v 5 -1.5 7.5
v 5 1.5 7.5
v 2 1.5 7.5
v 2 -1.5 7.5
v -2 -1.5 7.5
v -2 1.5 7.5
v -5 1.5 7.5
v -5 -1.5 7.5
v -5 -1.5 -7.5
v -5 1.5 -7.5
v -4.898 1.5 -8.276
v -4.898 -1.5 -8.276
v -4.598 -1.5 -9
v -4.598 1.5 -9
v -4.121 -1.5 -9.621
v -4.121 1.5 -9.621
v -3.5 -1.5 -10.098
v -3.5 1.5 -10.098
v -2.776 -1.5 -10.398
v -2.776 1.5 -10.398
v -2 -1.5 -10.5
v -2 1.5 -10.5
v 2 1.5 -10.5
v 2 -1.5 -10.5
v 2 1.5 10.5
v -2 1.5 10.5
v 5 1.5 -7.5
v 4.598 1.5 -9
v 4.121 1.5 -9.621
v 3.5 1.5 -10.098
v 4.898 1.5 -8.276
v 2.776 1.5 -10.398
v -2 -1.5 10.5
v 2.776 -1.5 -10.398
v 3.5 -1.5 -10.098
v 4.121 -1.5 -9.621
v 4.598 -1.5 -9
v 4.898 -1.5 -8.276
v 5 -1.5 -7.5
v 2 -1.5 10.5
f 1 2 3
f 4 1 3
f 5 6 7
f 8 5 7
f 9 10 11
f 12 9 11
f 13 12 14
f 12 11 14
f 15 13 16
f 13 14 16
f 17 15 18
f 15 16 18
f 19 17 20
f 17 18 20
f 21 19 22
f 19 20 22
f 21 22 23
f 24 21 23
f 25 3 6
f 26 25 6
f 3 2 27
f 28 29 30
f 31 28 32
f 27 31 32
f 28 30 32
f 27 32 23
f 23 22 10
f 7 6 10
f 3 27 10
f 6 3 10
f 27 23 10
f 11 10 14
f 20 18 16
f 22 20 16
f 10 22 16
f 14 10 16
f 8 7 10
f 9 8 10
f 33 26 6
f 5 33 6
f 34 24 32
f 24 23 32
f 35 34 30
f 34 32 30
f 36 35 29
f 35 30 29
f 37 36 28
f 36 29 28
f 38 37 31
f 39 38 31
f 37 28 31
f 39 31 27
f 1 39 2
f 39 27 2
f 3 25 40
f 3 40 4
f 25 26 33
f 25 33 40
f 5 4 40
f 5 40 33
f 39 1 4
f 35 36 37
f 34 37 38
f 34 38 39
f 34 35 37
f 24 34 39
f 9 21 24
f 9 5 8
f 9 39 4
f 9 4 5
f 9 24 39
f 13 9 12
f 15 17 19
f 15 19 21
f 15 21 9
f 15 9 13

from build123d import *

# Parameters (mm, degrees)
BOSS_EXTRUDE4_DEPTH = 1.5
SKETCH8_W           = 4
SKETCH8_H           = 3
BOSS_EXTRUDE5_DEPTH = 1.5


with BuildPart() as part:
    # Sketch6 → Boss-Extrude4 (new body, symmetric)
    with BuildSketch(Plane(origin=(0, 0, 0), x_dir=(1, 0, 0), z_dir=(0, 1, 0))):
        with BuildLine():
            Line((-2, 10.5), (2, 10.5))
            ThreePointArc((2, 10.5), (4.121320344, 9.621320344), (5, 7.5))
            Line((5, 7.5), (5, -7.5))
            Line((5, -7.5), (-5, -7.5))
            Line((-5, -7.5), (-5, 7.5))
            ThreePointArc((-5, 7.5), (-4.121320344, 9.621320344), (-2, 10.5))
        make_face()
    extrude(amount=BOSS_EXTRUDE4_DEPTH, both=True)

    # Sketch8 → Boss-Extrude5 (add, symmetric)
    with BuildSketch(Plane(origin=(0, 0, 0), x_dir=(1, 0, 0), z_dir=(0, 1, 0))):
        with Locations((0, -9)):
            Rectangle(SKETCH8_W, SKETCH8_H)
    extrude(amount=BOSS_EXTRUDE5_DEPTH, both=True)


solid = part.part
